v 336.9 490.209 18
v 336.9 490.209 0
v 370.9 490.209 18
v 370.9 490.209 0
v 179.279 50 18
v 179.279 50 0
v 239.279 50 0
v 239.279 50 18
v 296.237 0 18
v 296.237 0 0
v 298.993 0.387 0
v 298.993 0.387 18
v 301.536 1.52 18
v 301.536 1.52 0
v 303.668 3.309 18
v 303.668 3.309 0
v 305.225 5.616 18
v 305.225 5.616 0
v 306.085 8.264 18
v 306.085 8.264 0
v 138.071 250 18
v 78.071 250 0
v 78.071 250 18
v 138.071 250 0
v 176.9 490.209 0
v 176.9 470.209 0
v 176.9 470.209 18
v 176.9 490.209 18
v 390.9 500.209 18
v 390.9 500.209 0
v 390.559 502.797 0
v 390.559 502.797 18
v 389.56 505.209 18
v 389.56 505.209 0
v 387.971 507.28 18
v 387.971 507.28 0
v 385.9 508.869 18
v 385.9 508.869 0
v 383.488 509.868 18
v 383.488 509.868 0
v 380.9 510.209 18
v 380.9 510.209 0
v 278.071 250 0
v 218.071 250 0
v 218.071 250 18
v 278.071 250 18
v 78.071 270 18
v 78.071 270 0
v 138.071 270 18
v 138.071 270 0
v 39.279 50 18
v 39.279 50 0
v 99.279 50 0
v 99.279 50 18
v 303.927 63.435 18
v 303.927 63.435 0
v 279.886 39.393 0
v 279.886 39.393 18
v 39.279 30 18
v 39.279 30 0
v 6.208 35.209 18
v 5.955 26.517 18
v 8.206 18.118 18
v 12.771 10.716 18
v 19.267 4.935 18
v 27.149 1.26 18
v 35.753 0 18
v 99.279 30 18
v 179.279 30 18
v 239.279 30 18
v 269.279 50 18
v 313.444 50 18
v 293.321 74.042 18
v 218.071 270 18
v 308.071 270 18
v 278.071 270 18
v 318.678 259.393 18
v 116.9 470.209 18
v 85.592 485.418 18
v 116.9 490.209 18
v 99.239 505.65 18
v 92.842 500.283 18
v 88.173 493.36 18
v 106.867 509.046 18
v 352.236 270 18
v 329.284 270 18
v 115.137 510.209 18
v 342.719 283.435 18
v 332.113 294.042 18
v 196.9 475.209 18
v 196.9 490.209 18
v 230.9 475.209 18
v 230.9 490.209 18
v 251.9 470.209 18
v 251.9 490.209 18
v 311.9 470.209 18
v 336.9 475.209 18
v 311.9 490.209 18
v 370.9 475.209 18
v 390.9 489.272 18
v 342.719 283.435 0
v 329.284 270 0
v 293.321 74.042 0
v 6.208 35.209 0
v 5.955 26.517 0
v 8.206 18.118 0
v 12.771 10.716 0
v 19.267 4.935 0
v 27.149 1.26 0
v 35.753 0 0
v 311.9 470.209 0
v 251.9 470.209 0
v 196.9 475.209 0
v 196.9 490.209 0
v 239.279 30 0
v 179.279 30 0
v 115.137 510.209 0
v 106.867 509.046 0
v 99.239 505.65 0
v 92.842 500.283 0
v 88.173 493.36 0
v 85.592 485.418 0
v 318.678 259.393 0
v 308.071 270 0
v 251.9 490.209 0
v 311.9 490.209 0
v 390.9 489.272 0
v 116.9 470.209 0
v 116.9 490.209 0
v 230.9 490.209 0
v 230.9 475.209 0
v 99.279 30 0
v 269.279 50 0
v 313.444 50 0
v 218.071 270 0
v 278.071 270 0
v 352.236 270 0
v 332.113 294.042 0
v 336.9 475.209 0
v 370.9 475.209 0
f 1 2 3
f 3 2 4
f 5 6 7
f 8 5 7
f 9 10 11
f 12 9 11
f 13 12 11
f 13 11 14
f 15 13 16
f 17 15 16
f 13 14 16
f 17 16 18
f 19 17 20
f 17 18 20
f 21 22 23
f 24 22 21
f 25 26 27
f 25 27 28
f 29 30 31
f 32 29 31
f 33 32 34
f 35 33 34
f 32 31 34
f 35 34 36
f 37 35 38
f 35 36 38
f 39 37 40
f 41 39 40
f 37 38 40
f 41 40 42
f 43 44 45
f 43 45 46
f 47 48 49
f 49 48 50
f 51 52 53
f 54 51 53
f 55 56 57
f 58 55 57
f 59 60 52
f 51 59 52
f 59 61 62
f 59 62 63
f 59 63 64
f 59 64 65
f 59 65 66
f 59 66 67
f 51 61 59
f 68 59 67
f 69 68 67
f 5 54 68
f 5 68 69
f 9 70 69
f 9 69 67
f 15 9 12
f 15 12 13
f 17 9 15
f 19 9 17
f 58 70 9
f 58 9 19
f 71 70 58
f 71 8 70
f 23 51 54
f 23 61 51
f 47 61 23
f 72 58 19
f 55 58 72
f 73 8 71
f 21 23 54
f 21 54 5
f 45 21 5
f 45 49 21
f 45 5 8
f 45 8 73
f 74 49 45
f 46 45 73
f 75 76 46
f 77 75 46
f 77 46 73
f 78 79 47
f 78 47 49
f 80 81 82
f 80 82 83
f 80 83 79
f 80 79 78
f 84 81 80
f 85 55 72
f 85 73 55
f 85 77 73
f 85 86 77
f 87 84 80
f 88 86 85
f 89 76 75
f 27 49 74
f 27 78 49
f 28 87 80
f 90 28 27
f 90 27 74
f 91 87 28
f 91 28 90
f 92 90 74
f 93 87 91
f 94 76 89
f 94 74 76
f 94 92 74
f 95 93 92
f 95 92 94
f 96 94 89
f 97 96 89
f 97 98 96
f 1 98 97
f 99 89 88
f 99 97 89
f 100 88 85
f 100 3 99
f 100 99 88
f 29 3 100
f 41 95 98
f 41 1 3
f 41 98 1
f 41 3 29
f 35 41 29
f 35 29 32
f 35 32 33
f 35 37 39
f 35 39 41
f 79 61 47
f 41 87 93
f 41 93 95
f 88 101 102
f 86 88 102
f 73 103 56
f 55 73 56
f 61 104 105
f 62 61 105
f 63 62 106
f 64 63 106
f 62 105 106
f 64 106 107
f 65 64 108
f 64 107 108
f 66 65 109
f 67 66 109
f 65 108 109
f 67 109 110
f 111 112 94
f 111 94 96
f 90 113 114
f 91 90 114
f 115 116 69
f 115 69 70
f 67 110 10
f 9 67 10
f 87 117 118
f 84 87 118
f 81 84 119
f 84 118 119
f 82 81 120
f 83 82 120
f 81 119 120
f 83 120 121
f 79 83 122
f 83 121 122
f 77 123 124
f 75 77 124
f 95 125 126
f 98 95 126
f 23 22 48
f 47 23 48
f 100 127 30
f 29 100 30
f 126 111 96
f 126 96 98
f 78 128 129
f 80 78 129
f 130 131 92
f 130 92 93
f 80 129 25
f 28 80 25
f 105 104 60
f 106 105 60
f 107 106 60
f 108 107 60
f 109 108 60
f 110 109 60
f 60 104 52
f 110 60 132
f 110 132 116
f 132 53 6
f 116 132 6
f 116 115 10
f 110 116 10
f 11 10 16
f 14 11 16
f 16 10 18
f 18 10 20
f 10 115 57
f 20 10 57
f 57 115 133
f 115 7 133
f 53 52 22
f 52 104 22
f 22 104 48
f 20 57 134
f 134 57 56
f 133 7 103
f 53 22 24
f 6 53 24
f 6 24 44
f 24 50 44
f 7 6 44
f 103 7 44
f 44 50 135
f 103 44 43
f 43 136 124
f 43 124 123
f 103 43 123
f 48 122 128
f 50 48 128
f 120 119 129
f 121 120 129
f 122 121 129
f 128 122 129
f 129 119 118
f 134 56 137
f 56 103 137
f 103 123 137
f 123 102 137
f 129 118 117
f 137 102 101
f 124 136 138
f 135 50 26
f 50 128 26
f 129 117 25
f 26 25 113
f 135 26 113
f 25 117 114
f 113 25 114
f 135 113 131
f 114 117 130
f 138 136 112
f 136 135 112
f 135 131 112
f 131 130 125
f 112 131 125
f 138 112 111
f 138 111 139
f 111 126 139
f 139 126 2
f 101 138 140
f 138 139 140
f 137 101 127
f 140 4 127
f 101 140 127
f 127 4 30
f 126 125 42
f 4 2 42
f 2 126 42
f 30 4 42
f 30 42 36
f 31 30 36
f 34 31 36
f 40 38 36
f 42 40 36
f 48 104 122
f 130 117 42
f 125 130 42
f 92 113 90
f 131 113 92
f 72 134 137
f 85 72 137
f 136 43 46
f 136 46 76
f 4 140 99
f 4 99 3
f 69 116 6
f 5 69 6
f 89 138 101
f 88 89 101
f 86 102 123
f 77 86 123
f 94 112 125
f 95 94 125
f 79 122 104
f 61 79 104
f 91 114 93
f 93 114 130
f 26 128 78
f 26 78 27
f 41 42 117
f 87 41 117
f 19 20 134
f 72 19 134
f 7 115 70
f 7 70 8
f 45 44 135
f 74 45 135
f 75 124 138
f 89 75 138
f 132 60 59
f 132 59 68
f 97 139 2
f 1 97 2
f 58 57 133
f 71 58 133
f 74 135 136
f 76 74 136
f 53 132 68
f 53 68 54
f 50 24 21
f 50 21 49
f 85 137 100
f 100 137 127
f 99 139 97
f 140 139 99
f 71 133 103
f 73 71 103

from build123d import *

# Parameters (mm, degrees)
F0_W     = 60
F0_H     = 20
F0_W_2   = 34
F0_H_2   = 15
F1_DEPTH = 18


with BuildPart() as f1:
    # F0 (on Top) → F1 (new body)
    with BuildSketch(Plane.XY):
        with BuildLine():
            ThreePointArc((115.136532, 510.208606), (95.852904, 503.18994), (85.592299, 485.418052))
            Line((85.592299, 485.418052), (6.208375, 35.209445))
            ThreePointArc((6.208375, 35.209445), (12.771274, 10.716372), (35.752608, 0))
            Line((35.752608, 0), (296.236987, 0))
            ThreePointArc((296.236987, 0), (302.664863, 2.339556), (306.085065, 8.263518))
            Line((306.085065, 8.263518), (313.444333, 50))
            Line((313.444333, 50), (352.236268, 270))
            Line((352.236268, 270), (390.899802, 489.271795))
            Line((390.899802, 489.271795), (390.899802, 500.208606))
            ThreePointArc((390.899802, 500.208606), (387.97087, 507.279674), (380.899802, 510.208606))
            Line((380.899802, 510.208606), (115.136532, 510.208606))
        make_face()
        with Locations((69.279147, 40)):
            Rectangle(F0_W, F0_H, mode=Mode.SUBTRACT)
        with Locations((209.279147, 40)):
            Rectangle(F0_W, F0_H, mode=Mode.SUBTRACT)
        Polygon((303.92738, 63.435029), (290.492351, 50), (279.885749, 39.393398), (269.279147, 50), (293.320778, 74.041631), align=None, mode=Mode.SUBTRACT)
        with Locations((108.071083, 260)):
            Rectangle(F0_W, F0_H, mode=Mode.SUBTRACT)
        with Locations((146.899802, 480.208606)):
            Rectangle(F0_W, F0_H, mode=Mode.SUBTRACT)
        with Locations((248.071083, 260)):
            Rectangle(F0_W, F0_H, mode=Mode.SUBTRACT)
        Polygon((342.719315, 283.435029), (329.284287, 270), (318.677685, 259.393398), (308.071083, 270), (332.112714, 294.041631), align=None, mode=Mode.SUBTRACT)
        with Locations((213.899802, 482.708606)):
            Rectangle(F0_W_2, F0_H_2, mode=Mode.SUBTRACT)
        with Locations((281.899802, 480.208606)):
            Rectangle(F0_W, F0_H, mode=Mode.SUBTRACT)
        with Locations((353.899802, 482.708606)):
            Rectangle(F0_W_2, F0_H_2, mode=Mode.SUBTRACT)
    extrude(amount=F1_DEPTH)


solid = f1.part
